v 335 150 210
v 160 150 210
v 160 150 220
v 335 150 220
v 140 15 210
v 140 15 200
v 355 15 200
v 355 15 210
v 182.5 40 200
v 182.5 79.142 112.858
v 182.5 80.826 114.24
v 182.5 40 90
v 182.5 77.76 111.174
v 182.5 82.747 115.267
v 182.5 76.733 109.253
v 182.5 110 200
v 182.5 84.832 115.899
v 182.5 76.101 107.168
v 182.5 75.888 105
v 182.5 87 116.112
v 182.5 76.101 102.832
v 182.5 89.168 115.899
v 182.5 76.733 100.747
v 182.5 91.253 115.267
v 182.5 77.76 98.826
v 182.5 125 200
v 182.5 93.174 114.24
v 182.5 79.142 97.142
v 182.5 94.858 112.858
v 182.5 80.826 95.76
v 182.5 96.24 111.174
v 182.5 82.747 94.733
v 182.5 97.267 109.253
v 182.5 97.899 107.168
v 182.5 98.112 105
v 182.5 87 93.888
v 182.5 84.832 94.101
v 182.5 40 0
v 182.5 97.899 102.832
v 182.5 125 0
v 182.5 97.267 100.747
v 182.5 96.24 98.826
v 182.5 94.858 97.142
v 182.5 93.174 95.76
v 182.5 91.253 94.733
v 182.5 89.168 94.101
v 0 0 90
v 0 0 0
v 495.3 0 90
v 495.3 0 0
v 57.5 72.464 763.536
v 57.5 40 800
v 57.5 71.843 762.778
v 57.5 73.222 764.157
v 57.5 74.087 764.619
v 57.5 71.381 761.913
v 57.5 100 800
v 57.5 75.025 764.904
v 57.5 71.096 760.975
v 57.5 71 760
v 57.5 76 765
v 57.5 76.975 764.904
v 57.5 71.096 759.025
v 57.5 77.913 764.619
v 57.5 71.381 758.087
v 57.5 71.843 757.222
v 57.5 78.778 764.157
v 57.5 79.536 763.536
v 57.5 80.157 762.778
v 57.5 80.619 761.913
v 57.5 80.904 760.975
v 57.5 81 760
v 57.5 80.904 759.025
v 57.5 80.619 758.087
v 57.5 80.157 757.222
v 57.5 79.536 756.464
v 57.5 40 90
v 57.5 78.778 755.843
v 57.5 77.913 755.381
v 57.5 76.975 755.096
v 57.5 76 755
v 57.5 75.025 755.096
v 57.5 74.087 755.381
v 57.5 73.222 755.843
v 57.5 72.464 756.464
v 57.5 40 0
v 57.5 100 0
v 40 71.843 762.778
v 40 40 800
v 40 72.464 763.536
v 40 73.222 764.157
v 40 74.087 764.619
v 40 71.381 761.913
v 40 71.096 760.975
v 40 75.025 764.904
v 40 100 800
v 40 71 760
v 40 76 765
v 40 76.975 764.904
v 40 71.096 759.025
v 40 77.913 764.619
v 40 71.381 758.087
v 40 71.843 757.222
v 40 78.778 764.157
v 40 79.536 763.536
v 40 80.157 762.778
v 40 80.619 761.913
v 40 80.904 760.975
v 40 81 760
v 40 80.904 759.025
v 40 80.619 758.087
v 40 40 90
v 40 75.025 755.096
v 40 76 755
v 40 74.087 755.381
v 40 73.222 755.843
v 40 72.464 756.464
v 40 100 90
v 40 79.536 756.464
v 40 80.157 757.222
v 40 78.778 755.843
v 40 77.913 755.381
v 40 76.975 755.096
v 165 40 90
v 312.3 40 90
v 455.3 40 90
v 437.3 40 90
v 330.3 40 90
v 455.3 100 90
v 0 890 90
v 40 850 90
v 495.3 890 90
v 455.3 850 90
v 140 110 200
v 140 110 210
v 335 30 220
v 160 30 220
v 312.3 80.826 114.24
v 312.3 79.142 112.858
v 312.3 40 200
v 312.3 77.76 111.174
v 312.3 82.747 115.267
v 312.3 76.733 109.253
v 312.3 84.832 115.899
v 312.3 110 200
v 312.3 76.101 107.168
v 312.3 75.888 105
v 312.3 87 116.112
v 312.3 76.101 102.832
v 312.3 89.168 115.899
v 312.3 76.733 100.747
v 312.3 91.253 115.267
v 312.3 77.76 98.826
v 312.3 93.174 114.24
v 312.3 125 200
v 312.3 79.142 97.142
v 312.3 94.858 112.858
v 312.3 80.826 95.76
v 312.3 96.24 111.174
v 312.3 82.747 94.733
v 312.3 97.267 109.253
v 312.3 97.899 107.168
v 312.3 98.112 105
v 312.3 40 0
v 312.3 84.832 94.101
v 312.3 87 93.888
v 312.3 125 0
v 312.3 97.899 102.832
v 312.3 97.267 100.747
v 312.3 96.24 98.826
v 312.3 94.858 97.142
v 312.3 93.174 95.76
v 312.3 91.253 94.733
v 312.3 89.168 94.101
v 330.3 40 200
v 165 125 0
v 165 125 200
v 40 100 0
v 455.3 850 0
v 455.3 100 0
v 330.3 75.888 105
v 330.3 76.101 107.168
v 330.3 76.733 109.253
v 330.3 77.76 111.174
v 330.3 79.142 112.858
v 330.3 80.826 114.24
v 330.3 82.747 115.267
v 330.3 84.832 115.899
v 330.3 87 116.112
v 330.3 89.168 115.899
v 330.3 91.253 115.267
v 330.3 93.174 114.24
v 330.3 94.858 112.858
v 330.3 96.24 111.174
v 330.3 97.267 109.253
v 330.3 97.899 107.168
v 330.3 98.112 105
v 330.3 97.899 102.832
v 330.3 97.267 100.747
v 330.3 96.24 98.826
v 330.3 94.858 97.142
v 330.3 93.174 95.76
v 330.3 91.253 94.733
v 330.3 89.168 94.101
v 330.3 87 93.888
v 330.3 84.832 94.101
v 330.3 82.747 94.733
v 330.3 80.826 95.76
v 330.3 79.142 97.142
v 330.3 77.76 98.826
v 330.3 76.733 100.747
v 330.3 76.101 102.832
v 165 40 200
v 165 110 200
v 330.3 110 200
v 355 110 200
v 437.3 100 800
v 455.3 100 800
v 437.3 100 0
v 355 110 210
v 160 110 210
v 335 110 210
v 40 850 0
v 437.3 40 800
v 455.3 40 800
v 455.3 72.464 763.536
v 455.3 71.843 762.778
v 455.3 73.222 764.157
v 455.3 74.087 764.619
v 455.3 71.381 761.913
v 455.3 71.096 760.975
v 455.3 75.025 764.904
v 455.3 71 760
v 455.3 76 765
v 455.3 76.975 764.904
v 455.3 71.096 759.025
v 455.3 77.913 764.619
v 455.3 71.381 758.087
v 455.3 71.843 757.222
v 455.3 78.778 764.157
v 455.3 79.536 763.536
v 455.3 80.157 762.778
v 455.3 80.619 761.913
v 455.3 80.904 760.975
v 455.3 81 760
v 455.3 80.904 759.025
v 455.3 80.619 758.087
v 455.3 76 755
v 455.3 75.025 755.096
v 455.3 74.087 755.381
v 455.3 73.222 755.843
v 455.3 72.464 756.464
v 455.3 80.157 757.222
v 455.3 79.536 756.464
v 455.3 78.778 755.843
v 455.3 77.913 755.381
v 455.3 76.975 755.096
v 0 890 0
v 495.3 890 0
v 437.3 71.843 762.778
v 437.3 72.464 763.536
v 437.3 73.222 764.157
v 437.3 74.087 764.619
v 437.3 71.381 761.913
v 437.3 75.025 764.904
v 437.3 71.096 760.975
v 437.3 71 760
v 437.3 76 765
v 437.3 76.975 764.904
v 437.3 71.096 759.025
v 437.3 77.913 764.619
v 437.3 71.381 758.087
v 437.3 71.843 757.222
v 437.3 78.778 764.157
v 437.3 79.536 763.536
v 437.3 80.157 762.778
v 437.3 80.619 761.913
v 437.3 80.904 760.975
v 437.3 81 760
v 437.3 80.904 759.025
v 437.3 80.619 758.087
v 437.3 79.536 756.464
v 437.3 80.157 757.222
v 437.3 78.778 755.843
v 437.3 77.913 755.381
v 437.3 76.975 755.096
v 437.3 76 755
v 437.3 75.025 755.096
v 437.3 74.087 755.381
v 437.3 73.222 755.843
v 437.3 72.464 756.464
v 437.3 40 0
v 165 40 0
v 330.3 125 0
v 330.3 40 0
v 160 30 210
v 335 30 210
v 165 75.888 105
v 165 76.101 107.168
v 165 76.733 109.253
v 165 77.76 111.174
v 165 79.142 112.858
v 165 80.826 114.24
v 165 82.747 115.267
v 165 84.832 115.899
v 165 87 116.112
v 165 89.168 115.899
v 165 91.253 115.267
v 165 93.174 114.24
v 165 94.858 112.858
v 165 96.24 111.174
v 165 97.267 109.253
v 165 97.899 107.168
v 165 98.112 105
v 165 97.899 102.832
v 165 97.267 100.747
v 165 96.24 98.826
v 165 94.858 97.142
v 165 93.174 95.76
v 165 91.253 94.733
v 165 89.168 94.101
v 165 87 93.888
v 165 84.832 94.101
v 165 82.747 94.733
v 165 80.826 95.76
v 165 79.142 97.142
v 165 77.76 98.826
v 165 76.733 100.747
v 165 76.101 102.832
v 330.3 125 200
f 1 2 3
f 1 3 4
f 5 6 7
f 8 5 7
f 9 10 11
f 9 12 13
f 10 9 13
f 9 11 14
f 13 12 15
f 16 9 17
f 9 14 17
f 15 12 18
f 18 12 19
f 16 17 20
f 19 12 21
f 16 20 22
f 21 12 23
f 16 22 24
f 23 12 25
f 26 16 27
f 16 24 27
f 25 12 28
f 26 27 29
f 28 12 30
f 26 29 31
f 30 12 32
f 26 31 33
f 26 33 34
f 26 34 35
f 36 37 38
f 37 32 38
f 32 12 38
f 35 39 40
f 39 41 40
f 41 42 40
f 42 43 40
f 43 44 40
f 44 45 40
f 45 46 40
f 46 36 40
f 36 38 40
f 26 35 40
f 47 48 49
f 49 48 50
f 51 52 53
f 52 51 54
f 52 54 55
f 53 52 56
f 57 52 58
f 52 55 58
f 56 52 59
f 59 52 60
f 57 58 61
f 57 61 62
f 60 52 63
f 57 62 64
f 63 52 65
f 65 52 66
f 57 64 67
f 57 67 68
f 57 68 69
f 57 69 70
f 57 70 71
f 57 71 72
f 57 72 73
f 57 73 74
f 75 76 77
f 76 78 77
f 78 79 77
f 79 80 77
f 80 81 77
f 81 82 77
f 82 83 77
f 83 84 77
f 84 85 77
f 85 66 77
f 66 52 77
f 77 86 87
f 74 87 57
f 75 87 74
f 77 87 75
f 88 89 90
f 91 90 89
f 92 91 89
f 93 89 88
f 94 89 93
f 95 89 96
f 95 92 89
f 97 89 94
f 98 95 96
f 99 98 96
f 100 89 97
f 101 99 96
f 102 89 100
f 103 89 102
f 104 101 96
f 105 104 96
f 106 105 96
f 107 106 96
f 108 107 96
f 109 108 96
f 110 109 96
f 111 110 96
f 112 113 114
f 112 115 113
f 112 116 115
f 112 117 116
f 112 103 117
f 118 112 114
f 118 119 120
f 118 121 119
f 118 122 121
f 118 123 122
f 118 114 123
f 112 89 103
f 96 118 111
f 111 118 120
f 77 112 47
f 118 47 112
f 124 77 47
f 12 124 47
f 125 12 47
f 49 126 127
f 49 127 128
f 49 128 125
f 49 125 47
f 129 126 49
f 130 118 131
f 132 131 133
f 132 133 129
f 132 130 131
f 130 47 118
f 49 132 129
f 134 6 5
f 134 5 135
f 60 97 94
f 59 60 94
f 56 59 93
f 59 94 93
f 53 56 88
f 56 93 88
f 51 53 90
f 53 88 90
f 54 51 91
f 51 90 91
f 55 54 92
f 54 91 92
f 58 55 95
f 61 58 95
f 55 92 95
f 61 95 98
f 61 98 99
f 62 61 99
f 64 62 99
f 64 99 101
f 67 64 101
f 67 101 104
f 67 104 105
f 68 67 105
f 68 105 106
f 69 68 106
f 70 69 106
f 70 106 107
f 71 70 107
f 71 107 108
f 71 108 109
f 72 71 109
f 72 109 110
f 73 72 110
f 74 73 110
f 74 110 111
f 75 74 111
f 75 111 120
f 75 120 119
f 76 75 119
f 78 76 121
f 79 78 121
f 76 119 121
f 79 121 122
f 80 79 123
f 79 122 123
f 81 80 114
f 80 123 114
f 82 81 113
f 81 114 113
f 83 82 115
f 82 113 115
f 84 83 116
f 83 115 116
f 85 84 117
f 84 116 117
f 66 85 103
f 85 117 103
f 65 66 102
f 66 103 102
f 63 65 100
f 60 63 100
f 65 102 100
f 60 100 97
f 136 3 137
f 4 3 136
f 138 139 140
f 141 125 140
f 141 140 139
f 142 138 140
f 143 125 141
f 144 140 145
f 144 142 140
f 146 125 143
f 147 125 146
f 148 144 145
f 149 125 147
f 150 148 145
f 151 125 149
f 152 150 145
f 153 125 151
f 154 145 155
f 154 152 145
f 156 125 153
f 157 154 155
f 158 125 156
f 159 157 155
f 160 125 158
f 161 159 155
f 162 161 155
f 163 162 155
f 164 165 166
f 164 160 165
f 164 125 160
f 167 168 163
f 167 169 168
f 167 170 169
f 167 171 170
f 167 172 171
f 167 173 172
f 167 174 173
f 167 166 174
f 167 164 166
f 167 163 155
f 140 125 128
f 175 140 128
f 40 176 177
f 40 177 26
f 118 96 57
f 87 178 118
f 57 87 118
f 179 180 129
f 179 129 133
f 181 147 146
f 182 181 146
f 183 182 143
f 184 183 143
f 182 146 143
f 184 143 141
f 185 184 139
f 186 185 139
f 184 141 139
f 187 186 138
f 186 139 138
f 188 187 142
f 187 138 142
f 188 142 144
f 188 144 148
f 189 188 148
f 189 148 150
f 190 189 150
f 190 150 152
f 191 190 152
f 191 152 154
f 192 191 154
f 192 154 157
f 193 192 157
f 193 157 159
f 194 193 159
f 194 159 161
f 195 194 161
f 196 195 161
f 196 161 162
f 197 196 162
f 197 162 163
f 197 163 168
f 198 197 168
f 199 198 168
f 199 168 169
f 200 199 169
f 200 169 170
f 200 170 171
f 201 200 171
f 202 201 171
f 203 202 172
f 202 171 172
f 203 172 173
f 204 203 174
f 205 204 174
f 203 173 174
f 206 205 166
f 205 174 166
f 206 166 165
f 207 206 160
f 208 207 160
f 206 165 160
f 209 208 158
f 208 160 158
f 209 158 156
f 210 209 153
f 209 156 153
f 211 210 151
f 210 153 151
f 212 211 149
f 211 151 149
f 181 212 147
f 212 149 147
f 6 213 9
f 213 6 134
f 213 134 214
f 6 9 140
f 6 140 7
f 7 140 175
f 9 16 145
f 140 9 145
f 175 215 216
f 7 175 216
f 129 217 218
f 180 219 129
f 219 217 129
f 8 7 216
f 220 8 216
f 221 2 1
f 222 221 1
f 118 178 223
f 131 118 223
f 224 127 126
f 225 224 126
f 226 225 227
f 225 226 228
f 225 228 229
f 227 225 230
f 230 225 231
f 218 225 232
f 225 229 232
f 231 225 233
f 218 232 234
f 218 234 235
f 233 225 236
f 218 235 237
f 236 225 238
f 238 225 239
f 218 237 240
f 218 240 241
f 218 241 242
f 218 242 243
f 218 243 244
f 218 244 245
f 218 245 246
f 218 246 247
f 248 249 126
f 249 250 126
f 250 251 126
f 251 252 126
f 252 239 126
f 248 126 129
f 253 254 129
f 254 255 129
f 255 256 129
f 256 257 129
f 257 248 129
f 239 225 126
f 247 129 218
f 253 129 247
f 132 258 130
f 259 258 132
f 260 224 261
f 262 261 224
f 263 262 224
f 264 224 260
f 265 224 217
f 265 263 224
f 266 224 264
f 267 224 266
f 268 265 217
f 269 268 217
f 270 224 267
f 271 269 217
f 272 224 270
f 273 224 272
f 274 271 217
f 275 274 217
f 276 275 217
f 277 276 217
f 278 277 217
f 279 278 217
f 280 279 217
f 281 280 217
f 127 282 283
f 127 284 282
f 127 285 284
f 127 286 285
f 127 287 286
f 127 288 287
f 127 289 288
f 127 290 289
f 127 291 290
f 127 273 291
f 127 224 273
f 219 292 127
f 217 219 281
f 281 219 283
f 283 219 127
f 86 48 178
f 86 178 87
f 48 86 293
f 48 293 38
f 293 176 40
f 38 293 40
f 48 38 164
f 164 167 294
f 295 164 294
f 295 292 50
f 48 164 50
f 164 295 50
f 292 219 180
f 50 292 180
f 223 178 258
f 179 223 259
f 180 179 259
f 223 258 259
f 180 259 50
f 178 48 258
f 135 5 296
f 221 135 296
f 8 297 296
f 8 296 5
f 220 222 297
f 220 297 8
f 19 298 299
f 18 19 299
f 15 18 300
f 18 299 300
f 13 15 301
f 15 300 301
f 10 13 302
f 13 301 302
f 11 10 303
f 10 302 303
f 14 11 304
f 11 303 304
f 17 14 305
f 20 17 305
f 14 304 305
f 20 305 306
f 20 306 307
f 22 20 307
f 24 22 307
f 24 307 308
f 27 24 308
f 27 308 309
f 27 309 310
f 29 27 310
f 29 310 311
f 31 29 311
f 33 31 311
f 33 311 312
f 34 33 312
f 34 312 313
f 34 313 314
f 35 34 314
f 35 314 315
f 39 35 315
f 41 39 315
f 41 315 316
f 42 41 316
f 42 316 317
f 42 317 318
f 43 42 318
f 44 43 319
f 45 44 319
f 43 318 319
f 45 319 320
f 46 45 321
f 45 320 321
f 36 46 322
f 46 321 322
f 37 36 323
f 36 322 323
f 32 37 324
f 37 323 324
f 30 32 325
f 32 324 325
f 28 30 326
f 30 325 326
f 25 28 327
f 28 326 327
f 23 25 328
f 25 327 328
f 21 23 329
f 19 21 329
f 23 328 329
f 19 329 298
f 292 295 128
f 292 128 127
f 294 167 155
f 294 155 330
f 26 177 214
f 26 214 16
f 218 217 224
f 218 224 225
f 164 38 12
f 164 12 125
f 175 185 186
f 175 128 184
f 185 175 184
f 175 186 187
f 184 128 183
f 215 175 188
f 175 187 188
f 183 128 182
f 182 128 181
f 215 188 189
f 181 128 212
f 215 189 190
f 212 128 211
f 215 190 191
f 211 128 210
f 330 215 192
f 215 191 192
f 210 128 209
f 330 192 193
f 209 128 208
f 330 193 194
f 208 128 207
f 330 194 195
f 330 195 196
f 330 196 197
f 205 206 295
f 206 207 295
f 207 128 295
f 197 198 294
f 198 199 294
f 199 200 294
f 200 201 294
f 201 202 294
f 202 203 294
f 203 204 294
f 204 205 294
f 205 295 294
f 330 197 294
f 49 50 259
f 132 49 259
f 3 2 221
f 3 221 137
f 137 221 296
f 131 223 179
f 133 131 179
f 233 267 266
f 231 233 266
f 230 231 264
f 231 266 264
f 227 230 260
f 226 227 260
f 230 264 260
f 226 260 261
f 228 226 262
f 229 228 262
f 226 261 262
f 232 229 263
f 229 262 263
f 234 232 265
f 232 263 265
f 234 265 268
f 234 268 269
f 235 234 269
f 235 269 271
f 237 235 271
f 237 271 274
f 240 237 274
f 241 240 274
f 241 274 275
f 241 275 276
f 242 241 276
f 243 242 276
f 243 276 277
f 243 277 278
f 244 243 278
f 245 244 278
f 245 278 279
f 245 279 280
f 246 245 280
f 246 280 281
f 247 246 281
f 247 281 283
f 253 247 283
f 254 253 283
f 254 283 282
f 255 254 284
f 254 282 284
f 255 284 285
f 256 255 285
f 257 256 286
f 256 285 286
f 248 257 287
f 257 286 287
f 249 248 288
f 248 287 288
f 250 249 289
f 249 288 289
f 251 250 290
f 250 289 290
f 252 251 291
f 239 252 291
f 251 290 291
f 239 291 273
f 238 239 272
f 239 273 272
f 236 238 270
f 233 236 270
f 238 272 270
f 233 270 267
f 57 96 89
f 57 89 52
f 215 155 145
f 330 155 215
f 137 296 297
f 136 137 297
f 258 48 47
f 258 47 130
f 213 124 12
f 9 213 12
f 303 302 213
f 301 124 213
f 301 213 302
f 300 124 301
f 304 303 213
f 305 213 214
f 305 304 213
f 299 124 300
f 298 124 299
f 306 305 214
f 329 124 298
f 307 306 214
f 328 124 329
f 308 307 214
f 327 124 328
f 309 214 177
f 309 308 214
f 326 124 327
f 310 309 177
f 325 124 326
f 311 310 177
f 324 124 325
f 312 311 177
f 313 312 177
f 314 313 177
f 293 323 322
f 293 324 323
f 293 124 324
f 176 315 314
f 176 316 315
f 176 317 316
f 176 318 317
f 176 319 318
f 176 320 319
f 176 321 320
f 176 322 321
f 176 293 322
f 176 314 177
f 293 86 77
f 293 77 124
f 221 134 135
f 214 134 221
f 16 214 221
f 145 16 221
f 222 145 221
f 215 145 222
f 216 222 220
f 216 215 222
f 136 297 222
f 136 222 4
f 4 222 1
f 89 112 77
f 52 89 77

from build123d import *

# Parameters (mm, degrees)
F0_W      = 495.3
F0_H      = 890
F0_W_2    = 415.3
F0_H_2    = 810
F1_DEPTH  = 90
F2_W      = 17.5
F2_H      = 85
F2_W_2    = 18
F3_DEPTH  = 200
F4_W      = 17.5
F4_H      = 60
F4_W_2    = 18
F5_DEPTH  = 800
F6_R      = 5
F7_DEPTH  = 453
F8_R      = 11.1125
F9_DEPTH  = 184
F10_W     = 215
F10_H     = 95
F11_DEPTH = 10
F12_W     = 175
F12_H     = 80
F12_H_2   = 40
F13_DEPTH = 10


with BuildPart() as f1:
    # F0 (on Top) → F1 (new body)
    with BuildSketch(Plane.XY):
        with Locations((247.65, 445)):
            Rectangle(F0_W, F0_H)
        with Locations((247.65, 445)):
            Rectangle(F0_W_2, F0_H_2, mode=Mode.SUBTRACT)
    extrude(amount=F1_DEPTH)

    # F2 (on Top) → F3 (join)
    with BuildSketch(Plane.XY):
        with Locations((173.75, 82.5)):
            Rectangle(F2_W, F2_H)
        with Locations((321.3, 82.5)):
            Rectangle(F2_W_2, F2_H)
    extrude(amount=F3_DEPTH)

    # F4 (on Top) → F5 (join)
    with BuildSketch(Plane.XY):
        with Locations((48.75, 70)):
            Rectangle(F4_W, F4_H)
        with Locations((446.3, 70)):
            Rectangle(F4_W_2, F4_H)
    extrude(amount=F5_DEPTH)

    # F6 (on face) → F7 (cut)
    with BuildSketch(Plane(origin=(40, 0, 0), x_dir=(0, -1, 0), z_dir=(-1, 0, 0))):
        with Locations((-76, 760)):
            Circle(F6_R)
    extrude(amount=-F7_DEPTH, mode=Mode.SUBTRACT)

    # F8 (on face) → F9 (cut)
    with BuildSketch(Plane(origin=(165, 0, 0), x_dir=(0, -1, 0), z_dir=(-1, 0, 0))):
        with Locations((-87, 105)):
            Circle(F8_R)
    extrude(amount=-F9_DEPTH, mode=Mode.SUBTRACT)

    # F10 (on face) → F11 (join)
    with BuildSketch(Plane.XY.offset(200)):
        with Locations((247.5, 62.5)):
            Rectangle(F10_W, F10_H)
    extrude(amount=F11_DEPTH)

    # F12 (on face) → F13 (join)
    with BuildSketch(Plane.XY.offset(210)):
        with Locations((247.5, 70)):
            Rectangle(F12_W, F12_H)
        with Locations((247.5, 130)):
            Rectangle(F12_W, F12_H_2)
    extrude(amount=F13_DEPTH)


solid = f1.part
